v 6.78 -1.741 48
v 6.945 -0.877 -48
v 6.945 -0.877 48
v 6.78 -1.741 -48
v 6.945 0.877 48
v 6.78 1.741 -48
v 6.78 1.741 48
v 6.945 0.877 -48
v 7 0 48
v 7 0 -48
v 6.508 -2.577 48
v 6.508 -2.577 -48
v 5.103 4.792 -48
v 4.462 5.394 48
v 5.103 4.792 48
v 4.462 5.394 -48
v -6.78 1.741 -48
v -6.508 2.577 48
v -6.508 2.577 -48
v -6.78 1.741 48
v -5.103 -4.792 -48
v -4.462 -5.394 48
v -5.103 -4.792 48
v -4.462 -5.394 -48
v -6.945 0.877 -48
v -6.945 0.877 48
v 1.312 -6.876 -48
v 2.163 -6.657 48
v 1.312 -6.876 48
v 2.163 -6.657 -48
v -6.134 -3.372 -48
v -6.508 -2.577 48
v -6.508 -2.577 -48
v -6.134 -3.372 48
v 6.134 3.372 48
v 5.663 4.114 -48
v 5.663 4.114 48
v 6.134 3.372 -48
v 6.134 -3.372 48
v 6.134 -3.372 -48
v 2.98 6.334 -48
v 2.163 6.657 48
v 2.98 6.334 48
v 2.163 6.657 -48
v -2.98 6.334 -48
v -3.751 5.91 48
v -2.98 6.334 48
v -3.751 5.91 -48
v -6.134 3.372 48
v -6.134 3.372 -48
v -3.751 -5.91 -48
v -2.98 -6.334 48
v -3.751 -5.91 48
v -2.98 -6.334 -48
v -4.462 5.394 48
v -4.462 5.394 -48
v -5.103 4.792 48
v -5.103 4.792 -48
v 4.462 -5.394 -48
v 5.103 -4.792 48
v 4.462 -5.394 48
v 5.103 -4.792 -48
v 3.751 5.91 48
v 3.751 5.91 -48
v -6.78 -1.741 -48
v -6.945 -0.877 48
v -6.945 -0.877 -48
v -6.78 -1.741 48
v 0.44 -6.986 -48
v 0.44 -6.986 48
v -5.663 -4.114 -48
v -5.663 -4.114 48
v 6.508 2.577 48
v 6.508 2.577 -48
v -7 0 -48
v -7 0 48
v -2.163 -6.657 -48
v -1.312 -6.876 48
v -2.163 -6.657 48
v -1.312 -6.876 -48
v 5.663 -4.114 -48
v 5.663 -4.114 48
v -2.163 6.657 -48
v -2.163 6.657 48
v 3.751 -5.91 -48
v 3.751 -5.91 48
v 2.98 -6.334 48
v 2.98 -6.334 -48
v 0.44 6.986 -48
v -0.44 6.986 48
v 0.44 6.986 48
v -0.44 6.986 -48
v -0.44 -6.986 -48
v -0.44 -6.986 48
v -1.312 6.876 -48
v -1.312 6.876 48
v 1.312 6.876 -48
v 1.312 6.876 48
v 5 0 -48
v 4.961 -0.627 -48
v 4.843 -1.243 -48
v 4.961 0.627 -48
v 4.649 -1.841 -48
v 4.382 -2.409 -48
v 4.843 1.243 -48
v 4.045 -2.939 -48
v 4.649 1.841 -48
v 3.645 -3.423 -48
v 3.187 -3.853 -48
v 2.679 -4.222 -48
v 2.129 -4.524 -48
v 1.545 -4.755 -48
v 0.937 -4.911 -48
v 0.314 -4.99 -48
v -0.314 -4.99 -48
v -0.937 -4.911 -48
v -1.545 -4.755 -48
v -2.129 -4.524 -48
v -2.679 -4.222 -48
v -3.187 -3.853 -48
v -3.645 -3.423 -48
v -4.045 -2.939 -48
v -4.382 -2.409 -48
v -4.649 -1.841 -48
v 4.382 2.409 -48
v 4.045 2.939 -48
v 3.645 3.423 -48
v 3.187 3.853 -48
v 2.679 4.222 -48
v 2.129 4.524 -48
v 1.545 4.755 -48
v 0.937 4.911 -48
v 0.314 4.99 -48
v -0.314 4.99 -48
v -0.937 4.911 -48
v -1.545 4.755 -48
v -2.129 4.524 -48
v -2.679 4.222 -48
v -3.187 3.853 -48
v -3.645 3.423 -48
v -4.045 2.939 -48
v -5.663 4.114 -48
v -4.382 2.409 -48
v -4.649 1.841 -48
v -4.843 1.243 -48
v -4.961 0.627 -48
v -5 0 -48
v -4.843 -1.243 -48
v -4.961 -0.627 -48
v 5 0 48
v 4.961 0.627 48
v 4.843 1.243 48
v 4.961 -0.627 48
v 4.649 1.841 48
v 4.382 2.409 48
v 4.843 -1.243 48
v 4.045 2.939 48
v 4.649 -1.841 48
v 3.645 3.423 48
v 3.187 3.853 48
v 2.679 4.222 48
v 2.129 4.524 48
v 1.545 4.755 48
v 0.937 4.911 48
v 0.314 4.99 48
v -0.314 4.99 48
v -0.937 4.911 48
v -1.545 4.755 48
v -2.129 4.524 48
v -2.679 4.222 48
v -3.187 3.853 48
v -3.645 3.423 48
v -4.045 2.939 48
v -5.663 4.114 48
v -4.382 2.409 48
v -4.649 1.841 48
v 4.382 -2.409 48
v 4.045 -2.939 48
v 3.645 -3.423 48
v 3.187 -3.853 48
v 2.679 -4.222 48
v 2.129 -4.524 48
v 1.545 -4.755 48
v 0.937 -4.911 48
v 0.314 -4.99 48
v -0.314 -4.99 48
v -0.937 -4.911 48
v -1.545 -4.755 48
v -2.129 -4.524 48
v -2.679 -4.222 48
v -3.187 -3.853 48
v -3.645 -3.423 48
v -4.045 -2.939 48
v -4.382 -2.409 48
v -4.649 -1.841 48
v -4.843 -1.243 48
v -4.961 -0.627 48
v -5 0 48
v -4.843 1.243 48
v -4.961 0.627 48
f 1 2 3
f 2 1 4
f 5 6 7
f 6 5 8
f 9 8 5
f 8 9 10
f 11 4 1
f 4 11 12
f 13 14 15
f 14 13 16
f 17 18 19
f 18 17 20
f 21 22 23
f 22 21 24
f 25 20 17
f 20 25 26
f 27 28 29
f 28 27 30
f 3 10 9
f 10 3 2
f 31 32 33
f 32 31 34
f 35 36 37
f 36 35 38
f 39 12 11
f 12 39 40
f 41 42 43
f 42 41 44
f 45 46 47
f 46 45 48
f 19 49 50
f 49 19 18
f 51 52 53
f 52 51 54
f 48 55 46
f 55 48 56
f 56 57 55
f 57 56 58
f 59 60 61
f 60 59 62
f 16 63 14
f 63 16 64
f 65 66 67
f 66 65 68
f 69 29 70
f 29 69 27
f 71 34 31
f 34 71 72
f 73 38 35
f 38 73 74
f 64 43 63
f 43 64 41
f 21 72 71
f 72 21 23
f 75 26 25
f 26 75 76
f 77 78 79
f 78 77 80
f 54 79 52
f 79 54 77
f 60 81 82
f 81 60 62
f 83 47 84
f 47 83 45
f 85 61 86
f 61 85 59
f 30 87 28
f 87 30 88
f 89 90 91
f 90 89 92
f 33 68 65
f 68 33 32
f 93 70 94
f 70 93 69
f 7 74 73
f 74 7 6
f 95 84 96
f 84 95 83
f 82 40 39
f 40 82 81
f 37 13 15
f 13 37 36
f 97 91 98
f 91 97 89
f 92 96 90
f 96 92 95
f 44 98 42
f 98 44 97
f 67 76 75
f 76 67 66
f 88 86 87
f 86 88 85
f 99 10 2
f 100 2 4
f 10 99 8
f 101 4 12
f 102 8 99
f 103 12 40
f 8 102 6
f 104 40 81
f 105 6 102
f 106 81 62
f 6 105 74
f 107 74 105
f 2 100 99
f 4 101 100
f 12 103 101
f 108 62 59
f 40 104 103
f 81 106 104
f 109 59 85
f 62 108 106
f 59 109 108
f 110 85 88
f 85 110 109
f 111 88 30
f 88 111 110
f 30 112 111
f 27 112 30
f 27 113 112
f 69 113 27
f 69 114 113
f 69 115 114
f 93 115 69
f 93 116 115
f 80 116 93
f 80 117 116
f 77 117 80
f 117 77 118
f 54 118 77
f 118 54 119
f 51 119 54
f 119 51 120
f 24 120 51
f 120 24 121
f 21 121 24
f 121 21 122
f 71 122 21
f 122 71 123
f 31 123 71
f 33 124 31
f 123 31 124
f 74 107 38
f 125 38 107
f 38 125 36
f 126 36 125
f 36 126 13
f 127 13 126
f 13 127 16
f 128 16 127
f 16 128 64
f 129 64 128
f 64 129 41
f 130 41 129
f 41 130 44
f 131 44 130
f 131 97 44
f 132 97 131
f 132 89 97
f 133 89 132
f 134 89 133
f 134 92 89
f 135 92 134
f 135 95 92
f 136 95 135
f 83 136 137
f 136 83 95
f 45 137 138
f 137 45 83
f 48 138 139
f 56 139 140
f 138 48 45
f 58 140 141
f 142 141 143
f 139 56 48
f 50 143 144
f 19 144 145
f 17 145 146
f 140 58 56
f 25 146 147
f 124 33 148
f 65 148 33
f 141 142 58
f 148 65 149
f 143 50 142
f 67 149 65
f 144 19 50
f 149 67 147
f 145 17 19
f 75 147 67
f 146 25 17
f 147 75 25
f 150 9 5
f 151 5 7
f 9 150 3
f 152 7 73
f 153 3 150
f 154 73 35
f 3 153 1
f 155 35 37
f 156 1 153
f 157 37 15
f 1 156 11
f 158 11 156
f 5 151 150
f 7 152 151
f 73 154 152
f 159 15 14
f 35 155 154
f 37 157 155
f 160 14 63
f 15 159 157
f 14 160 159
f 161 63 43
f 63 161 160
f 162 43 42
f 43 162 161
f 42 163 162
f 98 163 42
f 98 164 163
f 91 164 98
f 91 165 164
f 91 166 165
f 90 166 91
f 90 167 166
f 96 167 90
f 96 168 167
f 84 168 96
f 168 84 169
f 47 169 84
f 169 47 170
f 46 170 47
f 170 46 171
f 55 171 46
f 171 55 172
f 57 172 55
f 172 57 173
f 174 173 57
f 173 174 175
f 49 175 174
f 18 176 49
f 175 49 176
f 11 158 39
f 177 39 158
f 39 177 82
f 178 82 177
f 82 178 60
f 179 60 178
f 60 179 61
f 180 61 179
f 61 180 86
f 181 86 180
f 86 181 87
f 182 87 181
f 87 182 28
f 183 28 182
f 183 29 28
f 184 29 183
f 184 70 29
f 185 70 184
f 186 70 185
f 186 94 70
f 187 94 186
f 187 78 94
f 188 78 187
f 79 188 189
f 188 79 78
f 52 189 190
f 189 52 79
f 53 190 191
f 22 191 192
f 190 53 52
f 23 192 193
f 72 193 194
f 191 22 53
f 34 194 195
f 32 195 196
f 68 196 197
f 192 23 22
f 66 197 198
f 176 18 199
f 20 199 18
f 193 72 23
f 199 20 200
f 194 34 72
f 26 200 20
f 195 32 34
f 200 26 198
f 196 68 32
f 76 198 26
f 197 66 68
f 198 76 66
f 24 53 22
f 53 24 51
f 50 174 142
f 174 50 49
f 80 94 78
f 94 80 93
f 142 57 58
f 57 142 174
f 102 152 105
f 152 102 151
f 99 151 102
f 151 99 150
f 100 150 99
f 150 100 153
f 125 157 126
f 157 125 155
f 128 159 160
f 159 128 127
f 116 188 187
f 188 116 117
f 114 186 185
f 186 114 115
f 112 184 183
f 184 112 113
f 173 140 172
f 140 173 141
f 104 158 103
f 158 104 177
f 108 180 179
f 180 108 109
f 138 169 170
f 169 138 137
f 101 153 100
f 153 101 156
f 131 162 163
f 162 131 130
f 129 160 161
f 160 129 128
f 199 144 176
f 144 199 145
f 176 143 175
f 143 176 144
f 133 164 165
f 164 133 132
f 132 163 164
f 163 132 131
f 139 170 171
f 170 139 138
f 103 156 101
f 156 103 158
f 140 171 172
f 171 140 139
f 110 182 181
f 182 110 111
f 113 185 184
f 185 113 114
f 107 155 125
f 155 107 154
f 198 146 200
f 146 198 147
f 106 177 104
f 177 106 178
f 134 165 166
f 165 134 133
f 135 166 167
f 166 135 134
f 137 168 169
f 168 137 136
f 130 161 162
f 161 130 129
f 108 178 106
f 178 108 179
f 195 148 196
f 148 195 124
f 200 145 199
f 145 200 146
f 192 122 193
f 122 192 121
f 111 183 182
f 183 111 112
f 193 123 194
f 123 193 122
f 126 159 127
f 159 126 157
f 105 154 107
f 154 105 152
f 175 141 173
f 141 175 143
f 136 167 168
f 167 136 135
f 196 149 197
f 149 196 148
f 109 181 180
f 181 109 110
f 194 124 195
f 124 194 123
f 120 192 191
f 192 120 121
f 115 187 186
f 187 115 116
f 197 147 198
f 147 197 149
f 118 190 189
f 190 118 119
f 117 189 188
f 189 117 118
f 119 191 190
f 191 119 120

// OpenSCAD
$fn = 50;


difference() {
	union() {
		translate(v = [0, 0, -48.0000000000]) {
			cylinder(h = 96, r = 7.0000000000);
		}
	}
	union() {
		translate(v = [0, 0, -100.0000000000]) {
			cylinder(h = 200, r = 5.0000000000);
		}
	}
}
